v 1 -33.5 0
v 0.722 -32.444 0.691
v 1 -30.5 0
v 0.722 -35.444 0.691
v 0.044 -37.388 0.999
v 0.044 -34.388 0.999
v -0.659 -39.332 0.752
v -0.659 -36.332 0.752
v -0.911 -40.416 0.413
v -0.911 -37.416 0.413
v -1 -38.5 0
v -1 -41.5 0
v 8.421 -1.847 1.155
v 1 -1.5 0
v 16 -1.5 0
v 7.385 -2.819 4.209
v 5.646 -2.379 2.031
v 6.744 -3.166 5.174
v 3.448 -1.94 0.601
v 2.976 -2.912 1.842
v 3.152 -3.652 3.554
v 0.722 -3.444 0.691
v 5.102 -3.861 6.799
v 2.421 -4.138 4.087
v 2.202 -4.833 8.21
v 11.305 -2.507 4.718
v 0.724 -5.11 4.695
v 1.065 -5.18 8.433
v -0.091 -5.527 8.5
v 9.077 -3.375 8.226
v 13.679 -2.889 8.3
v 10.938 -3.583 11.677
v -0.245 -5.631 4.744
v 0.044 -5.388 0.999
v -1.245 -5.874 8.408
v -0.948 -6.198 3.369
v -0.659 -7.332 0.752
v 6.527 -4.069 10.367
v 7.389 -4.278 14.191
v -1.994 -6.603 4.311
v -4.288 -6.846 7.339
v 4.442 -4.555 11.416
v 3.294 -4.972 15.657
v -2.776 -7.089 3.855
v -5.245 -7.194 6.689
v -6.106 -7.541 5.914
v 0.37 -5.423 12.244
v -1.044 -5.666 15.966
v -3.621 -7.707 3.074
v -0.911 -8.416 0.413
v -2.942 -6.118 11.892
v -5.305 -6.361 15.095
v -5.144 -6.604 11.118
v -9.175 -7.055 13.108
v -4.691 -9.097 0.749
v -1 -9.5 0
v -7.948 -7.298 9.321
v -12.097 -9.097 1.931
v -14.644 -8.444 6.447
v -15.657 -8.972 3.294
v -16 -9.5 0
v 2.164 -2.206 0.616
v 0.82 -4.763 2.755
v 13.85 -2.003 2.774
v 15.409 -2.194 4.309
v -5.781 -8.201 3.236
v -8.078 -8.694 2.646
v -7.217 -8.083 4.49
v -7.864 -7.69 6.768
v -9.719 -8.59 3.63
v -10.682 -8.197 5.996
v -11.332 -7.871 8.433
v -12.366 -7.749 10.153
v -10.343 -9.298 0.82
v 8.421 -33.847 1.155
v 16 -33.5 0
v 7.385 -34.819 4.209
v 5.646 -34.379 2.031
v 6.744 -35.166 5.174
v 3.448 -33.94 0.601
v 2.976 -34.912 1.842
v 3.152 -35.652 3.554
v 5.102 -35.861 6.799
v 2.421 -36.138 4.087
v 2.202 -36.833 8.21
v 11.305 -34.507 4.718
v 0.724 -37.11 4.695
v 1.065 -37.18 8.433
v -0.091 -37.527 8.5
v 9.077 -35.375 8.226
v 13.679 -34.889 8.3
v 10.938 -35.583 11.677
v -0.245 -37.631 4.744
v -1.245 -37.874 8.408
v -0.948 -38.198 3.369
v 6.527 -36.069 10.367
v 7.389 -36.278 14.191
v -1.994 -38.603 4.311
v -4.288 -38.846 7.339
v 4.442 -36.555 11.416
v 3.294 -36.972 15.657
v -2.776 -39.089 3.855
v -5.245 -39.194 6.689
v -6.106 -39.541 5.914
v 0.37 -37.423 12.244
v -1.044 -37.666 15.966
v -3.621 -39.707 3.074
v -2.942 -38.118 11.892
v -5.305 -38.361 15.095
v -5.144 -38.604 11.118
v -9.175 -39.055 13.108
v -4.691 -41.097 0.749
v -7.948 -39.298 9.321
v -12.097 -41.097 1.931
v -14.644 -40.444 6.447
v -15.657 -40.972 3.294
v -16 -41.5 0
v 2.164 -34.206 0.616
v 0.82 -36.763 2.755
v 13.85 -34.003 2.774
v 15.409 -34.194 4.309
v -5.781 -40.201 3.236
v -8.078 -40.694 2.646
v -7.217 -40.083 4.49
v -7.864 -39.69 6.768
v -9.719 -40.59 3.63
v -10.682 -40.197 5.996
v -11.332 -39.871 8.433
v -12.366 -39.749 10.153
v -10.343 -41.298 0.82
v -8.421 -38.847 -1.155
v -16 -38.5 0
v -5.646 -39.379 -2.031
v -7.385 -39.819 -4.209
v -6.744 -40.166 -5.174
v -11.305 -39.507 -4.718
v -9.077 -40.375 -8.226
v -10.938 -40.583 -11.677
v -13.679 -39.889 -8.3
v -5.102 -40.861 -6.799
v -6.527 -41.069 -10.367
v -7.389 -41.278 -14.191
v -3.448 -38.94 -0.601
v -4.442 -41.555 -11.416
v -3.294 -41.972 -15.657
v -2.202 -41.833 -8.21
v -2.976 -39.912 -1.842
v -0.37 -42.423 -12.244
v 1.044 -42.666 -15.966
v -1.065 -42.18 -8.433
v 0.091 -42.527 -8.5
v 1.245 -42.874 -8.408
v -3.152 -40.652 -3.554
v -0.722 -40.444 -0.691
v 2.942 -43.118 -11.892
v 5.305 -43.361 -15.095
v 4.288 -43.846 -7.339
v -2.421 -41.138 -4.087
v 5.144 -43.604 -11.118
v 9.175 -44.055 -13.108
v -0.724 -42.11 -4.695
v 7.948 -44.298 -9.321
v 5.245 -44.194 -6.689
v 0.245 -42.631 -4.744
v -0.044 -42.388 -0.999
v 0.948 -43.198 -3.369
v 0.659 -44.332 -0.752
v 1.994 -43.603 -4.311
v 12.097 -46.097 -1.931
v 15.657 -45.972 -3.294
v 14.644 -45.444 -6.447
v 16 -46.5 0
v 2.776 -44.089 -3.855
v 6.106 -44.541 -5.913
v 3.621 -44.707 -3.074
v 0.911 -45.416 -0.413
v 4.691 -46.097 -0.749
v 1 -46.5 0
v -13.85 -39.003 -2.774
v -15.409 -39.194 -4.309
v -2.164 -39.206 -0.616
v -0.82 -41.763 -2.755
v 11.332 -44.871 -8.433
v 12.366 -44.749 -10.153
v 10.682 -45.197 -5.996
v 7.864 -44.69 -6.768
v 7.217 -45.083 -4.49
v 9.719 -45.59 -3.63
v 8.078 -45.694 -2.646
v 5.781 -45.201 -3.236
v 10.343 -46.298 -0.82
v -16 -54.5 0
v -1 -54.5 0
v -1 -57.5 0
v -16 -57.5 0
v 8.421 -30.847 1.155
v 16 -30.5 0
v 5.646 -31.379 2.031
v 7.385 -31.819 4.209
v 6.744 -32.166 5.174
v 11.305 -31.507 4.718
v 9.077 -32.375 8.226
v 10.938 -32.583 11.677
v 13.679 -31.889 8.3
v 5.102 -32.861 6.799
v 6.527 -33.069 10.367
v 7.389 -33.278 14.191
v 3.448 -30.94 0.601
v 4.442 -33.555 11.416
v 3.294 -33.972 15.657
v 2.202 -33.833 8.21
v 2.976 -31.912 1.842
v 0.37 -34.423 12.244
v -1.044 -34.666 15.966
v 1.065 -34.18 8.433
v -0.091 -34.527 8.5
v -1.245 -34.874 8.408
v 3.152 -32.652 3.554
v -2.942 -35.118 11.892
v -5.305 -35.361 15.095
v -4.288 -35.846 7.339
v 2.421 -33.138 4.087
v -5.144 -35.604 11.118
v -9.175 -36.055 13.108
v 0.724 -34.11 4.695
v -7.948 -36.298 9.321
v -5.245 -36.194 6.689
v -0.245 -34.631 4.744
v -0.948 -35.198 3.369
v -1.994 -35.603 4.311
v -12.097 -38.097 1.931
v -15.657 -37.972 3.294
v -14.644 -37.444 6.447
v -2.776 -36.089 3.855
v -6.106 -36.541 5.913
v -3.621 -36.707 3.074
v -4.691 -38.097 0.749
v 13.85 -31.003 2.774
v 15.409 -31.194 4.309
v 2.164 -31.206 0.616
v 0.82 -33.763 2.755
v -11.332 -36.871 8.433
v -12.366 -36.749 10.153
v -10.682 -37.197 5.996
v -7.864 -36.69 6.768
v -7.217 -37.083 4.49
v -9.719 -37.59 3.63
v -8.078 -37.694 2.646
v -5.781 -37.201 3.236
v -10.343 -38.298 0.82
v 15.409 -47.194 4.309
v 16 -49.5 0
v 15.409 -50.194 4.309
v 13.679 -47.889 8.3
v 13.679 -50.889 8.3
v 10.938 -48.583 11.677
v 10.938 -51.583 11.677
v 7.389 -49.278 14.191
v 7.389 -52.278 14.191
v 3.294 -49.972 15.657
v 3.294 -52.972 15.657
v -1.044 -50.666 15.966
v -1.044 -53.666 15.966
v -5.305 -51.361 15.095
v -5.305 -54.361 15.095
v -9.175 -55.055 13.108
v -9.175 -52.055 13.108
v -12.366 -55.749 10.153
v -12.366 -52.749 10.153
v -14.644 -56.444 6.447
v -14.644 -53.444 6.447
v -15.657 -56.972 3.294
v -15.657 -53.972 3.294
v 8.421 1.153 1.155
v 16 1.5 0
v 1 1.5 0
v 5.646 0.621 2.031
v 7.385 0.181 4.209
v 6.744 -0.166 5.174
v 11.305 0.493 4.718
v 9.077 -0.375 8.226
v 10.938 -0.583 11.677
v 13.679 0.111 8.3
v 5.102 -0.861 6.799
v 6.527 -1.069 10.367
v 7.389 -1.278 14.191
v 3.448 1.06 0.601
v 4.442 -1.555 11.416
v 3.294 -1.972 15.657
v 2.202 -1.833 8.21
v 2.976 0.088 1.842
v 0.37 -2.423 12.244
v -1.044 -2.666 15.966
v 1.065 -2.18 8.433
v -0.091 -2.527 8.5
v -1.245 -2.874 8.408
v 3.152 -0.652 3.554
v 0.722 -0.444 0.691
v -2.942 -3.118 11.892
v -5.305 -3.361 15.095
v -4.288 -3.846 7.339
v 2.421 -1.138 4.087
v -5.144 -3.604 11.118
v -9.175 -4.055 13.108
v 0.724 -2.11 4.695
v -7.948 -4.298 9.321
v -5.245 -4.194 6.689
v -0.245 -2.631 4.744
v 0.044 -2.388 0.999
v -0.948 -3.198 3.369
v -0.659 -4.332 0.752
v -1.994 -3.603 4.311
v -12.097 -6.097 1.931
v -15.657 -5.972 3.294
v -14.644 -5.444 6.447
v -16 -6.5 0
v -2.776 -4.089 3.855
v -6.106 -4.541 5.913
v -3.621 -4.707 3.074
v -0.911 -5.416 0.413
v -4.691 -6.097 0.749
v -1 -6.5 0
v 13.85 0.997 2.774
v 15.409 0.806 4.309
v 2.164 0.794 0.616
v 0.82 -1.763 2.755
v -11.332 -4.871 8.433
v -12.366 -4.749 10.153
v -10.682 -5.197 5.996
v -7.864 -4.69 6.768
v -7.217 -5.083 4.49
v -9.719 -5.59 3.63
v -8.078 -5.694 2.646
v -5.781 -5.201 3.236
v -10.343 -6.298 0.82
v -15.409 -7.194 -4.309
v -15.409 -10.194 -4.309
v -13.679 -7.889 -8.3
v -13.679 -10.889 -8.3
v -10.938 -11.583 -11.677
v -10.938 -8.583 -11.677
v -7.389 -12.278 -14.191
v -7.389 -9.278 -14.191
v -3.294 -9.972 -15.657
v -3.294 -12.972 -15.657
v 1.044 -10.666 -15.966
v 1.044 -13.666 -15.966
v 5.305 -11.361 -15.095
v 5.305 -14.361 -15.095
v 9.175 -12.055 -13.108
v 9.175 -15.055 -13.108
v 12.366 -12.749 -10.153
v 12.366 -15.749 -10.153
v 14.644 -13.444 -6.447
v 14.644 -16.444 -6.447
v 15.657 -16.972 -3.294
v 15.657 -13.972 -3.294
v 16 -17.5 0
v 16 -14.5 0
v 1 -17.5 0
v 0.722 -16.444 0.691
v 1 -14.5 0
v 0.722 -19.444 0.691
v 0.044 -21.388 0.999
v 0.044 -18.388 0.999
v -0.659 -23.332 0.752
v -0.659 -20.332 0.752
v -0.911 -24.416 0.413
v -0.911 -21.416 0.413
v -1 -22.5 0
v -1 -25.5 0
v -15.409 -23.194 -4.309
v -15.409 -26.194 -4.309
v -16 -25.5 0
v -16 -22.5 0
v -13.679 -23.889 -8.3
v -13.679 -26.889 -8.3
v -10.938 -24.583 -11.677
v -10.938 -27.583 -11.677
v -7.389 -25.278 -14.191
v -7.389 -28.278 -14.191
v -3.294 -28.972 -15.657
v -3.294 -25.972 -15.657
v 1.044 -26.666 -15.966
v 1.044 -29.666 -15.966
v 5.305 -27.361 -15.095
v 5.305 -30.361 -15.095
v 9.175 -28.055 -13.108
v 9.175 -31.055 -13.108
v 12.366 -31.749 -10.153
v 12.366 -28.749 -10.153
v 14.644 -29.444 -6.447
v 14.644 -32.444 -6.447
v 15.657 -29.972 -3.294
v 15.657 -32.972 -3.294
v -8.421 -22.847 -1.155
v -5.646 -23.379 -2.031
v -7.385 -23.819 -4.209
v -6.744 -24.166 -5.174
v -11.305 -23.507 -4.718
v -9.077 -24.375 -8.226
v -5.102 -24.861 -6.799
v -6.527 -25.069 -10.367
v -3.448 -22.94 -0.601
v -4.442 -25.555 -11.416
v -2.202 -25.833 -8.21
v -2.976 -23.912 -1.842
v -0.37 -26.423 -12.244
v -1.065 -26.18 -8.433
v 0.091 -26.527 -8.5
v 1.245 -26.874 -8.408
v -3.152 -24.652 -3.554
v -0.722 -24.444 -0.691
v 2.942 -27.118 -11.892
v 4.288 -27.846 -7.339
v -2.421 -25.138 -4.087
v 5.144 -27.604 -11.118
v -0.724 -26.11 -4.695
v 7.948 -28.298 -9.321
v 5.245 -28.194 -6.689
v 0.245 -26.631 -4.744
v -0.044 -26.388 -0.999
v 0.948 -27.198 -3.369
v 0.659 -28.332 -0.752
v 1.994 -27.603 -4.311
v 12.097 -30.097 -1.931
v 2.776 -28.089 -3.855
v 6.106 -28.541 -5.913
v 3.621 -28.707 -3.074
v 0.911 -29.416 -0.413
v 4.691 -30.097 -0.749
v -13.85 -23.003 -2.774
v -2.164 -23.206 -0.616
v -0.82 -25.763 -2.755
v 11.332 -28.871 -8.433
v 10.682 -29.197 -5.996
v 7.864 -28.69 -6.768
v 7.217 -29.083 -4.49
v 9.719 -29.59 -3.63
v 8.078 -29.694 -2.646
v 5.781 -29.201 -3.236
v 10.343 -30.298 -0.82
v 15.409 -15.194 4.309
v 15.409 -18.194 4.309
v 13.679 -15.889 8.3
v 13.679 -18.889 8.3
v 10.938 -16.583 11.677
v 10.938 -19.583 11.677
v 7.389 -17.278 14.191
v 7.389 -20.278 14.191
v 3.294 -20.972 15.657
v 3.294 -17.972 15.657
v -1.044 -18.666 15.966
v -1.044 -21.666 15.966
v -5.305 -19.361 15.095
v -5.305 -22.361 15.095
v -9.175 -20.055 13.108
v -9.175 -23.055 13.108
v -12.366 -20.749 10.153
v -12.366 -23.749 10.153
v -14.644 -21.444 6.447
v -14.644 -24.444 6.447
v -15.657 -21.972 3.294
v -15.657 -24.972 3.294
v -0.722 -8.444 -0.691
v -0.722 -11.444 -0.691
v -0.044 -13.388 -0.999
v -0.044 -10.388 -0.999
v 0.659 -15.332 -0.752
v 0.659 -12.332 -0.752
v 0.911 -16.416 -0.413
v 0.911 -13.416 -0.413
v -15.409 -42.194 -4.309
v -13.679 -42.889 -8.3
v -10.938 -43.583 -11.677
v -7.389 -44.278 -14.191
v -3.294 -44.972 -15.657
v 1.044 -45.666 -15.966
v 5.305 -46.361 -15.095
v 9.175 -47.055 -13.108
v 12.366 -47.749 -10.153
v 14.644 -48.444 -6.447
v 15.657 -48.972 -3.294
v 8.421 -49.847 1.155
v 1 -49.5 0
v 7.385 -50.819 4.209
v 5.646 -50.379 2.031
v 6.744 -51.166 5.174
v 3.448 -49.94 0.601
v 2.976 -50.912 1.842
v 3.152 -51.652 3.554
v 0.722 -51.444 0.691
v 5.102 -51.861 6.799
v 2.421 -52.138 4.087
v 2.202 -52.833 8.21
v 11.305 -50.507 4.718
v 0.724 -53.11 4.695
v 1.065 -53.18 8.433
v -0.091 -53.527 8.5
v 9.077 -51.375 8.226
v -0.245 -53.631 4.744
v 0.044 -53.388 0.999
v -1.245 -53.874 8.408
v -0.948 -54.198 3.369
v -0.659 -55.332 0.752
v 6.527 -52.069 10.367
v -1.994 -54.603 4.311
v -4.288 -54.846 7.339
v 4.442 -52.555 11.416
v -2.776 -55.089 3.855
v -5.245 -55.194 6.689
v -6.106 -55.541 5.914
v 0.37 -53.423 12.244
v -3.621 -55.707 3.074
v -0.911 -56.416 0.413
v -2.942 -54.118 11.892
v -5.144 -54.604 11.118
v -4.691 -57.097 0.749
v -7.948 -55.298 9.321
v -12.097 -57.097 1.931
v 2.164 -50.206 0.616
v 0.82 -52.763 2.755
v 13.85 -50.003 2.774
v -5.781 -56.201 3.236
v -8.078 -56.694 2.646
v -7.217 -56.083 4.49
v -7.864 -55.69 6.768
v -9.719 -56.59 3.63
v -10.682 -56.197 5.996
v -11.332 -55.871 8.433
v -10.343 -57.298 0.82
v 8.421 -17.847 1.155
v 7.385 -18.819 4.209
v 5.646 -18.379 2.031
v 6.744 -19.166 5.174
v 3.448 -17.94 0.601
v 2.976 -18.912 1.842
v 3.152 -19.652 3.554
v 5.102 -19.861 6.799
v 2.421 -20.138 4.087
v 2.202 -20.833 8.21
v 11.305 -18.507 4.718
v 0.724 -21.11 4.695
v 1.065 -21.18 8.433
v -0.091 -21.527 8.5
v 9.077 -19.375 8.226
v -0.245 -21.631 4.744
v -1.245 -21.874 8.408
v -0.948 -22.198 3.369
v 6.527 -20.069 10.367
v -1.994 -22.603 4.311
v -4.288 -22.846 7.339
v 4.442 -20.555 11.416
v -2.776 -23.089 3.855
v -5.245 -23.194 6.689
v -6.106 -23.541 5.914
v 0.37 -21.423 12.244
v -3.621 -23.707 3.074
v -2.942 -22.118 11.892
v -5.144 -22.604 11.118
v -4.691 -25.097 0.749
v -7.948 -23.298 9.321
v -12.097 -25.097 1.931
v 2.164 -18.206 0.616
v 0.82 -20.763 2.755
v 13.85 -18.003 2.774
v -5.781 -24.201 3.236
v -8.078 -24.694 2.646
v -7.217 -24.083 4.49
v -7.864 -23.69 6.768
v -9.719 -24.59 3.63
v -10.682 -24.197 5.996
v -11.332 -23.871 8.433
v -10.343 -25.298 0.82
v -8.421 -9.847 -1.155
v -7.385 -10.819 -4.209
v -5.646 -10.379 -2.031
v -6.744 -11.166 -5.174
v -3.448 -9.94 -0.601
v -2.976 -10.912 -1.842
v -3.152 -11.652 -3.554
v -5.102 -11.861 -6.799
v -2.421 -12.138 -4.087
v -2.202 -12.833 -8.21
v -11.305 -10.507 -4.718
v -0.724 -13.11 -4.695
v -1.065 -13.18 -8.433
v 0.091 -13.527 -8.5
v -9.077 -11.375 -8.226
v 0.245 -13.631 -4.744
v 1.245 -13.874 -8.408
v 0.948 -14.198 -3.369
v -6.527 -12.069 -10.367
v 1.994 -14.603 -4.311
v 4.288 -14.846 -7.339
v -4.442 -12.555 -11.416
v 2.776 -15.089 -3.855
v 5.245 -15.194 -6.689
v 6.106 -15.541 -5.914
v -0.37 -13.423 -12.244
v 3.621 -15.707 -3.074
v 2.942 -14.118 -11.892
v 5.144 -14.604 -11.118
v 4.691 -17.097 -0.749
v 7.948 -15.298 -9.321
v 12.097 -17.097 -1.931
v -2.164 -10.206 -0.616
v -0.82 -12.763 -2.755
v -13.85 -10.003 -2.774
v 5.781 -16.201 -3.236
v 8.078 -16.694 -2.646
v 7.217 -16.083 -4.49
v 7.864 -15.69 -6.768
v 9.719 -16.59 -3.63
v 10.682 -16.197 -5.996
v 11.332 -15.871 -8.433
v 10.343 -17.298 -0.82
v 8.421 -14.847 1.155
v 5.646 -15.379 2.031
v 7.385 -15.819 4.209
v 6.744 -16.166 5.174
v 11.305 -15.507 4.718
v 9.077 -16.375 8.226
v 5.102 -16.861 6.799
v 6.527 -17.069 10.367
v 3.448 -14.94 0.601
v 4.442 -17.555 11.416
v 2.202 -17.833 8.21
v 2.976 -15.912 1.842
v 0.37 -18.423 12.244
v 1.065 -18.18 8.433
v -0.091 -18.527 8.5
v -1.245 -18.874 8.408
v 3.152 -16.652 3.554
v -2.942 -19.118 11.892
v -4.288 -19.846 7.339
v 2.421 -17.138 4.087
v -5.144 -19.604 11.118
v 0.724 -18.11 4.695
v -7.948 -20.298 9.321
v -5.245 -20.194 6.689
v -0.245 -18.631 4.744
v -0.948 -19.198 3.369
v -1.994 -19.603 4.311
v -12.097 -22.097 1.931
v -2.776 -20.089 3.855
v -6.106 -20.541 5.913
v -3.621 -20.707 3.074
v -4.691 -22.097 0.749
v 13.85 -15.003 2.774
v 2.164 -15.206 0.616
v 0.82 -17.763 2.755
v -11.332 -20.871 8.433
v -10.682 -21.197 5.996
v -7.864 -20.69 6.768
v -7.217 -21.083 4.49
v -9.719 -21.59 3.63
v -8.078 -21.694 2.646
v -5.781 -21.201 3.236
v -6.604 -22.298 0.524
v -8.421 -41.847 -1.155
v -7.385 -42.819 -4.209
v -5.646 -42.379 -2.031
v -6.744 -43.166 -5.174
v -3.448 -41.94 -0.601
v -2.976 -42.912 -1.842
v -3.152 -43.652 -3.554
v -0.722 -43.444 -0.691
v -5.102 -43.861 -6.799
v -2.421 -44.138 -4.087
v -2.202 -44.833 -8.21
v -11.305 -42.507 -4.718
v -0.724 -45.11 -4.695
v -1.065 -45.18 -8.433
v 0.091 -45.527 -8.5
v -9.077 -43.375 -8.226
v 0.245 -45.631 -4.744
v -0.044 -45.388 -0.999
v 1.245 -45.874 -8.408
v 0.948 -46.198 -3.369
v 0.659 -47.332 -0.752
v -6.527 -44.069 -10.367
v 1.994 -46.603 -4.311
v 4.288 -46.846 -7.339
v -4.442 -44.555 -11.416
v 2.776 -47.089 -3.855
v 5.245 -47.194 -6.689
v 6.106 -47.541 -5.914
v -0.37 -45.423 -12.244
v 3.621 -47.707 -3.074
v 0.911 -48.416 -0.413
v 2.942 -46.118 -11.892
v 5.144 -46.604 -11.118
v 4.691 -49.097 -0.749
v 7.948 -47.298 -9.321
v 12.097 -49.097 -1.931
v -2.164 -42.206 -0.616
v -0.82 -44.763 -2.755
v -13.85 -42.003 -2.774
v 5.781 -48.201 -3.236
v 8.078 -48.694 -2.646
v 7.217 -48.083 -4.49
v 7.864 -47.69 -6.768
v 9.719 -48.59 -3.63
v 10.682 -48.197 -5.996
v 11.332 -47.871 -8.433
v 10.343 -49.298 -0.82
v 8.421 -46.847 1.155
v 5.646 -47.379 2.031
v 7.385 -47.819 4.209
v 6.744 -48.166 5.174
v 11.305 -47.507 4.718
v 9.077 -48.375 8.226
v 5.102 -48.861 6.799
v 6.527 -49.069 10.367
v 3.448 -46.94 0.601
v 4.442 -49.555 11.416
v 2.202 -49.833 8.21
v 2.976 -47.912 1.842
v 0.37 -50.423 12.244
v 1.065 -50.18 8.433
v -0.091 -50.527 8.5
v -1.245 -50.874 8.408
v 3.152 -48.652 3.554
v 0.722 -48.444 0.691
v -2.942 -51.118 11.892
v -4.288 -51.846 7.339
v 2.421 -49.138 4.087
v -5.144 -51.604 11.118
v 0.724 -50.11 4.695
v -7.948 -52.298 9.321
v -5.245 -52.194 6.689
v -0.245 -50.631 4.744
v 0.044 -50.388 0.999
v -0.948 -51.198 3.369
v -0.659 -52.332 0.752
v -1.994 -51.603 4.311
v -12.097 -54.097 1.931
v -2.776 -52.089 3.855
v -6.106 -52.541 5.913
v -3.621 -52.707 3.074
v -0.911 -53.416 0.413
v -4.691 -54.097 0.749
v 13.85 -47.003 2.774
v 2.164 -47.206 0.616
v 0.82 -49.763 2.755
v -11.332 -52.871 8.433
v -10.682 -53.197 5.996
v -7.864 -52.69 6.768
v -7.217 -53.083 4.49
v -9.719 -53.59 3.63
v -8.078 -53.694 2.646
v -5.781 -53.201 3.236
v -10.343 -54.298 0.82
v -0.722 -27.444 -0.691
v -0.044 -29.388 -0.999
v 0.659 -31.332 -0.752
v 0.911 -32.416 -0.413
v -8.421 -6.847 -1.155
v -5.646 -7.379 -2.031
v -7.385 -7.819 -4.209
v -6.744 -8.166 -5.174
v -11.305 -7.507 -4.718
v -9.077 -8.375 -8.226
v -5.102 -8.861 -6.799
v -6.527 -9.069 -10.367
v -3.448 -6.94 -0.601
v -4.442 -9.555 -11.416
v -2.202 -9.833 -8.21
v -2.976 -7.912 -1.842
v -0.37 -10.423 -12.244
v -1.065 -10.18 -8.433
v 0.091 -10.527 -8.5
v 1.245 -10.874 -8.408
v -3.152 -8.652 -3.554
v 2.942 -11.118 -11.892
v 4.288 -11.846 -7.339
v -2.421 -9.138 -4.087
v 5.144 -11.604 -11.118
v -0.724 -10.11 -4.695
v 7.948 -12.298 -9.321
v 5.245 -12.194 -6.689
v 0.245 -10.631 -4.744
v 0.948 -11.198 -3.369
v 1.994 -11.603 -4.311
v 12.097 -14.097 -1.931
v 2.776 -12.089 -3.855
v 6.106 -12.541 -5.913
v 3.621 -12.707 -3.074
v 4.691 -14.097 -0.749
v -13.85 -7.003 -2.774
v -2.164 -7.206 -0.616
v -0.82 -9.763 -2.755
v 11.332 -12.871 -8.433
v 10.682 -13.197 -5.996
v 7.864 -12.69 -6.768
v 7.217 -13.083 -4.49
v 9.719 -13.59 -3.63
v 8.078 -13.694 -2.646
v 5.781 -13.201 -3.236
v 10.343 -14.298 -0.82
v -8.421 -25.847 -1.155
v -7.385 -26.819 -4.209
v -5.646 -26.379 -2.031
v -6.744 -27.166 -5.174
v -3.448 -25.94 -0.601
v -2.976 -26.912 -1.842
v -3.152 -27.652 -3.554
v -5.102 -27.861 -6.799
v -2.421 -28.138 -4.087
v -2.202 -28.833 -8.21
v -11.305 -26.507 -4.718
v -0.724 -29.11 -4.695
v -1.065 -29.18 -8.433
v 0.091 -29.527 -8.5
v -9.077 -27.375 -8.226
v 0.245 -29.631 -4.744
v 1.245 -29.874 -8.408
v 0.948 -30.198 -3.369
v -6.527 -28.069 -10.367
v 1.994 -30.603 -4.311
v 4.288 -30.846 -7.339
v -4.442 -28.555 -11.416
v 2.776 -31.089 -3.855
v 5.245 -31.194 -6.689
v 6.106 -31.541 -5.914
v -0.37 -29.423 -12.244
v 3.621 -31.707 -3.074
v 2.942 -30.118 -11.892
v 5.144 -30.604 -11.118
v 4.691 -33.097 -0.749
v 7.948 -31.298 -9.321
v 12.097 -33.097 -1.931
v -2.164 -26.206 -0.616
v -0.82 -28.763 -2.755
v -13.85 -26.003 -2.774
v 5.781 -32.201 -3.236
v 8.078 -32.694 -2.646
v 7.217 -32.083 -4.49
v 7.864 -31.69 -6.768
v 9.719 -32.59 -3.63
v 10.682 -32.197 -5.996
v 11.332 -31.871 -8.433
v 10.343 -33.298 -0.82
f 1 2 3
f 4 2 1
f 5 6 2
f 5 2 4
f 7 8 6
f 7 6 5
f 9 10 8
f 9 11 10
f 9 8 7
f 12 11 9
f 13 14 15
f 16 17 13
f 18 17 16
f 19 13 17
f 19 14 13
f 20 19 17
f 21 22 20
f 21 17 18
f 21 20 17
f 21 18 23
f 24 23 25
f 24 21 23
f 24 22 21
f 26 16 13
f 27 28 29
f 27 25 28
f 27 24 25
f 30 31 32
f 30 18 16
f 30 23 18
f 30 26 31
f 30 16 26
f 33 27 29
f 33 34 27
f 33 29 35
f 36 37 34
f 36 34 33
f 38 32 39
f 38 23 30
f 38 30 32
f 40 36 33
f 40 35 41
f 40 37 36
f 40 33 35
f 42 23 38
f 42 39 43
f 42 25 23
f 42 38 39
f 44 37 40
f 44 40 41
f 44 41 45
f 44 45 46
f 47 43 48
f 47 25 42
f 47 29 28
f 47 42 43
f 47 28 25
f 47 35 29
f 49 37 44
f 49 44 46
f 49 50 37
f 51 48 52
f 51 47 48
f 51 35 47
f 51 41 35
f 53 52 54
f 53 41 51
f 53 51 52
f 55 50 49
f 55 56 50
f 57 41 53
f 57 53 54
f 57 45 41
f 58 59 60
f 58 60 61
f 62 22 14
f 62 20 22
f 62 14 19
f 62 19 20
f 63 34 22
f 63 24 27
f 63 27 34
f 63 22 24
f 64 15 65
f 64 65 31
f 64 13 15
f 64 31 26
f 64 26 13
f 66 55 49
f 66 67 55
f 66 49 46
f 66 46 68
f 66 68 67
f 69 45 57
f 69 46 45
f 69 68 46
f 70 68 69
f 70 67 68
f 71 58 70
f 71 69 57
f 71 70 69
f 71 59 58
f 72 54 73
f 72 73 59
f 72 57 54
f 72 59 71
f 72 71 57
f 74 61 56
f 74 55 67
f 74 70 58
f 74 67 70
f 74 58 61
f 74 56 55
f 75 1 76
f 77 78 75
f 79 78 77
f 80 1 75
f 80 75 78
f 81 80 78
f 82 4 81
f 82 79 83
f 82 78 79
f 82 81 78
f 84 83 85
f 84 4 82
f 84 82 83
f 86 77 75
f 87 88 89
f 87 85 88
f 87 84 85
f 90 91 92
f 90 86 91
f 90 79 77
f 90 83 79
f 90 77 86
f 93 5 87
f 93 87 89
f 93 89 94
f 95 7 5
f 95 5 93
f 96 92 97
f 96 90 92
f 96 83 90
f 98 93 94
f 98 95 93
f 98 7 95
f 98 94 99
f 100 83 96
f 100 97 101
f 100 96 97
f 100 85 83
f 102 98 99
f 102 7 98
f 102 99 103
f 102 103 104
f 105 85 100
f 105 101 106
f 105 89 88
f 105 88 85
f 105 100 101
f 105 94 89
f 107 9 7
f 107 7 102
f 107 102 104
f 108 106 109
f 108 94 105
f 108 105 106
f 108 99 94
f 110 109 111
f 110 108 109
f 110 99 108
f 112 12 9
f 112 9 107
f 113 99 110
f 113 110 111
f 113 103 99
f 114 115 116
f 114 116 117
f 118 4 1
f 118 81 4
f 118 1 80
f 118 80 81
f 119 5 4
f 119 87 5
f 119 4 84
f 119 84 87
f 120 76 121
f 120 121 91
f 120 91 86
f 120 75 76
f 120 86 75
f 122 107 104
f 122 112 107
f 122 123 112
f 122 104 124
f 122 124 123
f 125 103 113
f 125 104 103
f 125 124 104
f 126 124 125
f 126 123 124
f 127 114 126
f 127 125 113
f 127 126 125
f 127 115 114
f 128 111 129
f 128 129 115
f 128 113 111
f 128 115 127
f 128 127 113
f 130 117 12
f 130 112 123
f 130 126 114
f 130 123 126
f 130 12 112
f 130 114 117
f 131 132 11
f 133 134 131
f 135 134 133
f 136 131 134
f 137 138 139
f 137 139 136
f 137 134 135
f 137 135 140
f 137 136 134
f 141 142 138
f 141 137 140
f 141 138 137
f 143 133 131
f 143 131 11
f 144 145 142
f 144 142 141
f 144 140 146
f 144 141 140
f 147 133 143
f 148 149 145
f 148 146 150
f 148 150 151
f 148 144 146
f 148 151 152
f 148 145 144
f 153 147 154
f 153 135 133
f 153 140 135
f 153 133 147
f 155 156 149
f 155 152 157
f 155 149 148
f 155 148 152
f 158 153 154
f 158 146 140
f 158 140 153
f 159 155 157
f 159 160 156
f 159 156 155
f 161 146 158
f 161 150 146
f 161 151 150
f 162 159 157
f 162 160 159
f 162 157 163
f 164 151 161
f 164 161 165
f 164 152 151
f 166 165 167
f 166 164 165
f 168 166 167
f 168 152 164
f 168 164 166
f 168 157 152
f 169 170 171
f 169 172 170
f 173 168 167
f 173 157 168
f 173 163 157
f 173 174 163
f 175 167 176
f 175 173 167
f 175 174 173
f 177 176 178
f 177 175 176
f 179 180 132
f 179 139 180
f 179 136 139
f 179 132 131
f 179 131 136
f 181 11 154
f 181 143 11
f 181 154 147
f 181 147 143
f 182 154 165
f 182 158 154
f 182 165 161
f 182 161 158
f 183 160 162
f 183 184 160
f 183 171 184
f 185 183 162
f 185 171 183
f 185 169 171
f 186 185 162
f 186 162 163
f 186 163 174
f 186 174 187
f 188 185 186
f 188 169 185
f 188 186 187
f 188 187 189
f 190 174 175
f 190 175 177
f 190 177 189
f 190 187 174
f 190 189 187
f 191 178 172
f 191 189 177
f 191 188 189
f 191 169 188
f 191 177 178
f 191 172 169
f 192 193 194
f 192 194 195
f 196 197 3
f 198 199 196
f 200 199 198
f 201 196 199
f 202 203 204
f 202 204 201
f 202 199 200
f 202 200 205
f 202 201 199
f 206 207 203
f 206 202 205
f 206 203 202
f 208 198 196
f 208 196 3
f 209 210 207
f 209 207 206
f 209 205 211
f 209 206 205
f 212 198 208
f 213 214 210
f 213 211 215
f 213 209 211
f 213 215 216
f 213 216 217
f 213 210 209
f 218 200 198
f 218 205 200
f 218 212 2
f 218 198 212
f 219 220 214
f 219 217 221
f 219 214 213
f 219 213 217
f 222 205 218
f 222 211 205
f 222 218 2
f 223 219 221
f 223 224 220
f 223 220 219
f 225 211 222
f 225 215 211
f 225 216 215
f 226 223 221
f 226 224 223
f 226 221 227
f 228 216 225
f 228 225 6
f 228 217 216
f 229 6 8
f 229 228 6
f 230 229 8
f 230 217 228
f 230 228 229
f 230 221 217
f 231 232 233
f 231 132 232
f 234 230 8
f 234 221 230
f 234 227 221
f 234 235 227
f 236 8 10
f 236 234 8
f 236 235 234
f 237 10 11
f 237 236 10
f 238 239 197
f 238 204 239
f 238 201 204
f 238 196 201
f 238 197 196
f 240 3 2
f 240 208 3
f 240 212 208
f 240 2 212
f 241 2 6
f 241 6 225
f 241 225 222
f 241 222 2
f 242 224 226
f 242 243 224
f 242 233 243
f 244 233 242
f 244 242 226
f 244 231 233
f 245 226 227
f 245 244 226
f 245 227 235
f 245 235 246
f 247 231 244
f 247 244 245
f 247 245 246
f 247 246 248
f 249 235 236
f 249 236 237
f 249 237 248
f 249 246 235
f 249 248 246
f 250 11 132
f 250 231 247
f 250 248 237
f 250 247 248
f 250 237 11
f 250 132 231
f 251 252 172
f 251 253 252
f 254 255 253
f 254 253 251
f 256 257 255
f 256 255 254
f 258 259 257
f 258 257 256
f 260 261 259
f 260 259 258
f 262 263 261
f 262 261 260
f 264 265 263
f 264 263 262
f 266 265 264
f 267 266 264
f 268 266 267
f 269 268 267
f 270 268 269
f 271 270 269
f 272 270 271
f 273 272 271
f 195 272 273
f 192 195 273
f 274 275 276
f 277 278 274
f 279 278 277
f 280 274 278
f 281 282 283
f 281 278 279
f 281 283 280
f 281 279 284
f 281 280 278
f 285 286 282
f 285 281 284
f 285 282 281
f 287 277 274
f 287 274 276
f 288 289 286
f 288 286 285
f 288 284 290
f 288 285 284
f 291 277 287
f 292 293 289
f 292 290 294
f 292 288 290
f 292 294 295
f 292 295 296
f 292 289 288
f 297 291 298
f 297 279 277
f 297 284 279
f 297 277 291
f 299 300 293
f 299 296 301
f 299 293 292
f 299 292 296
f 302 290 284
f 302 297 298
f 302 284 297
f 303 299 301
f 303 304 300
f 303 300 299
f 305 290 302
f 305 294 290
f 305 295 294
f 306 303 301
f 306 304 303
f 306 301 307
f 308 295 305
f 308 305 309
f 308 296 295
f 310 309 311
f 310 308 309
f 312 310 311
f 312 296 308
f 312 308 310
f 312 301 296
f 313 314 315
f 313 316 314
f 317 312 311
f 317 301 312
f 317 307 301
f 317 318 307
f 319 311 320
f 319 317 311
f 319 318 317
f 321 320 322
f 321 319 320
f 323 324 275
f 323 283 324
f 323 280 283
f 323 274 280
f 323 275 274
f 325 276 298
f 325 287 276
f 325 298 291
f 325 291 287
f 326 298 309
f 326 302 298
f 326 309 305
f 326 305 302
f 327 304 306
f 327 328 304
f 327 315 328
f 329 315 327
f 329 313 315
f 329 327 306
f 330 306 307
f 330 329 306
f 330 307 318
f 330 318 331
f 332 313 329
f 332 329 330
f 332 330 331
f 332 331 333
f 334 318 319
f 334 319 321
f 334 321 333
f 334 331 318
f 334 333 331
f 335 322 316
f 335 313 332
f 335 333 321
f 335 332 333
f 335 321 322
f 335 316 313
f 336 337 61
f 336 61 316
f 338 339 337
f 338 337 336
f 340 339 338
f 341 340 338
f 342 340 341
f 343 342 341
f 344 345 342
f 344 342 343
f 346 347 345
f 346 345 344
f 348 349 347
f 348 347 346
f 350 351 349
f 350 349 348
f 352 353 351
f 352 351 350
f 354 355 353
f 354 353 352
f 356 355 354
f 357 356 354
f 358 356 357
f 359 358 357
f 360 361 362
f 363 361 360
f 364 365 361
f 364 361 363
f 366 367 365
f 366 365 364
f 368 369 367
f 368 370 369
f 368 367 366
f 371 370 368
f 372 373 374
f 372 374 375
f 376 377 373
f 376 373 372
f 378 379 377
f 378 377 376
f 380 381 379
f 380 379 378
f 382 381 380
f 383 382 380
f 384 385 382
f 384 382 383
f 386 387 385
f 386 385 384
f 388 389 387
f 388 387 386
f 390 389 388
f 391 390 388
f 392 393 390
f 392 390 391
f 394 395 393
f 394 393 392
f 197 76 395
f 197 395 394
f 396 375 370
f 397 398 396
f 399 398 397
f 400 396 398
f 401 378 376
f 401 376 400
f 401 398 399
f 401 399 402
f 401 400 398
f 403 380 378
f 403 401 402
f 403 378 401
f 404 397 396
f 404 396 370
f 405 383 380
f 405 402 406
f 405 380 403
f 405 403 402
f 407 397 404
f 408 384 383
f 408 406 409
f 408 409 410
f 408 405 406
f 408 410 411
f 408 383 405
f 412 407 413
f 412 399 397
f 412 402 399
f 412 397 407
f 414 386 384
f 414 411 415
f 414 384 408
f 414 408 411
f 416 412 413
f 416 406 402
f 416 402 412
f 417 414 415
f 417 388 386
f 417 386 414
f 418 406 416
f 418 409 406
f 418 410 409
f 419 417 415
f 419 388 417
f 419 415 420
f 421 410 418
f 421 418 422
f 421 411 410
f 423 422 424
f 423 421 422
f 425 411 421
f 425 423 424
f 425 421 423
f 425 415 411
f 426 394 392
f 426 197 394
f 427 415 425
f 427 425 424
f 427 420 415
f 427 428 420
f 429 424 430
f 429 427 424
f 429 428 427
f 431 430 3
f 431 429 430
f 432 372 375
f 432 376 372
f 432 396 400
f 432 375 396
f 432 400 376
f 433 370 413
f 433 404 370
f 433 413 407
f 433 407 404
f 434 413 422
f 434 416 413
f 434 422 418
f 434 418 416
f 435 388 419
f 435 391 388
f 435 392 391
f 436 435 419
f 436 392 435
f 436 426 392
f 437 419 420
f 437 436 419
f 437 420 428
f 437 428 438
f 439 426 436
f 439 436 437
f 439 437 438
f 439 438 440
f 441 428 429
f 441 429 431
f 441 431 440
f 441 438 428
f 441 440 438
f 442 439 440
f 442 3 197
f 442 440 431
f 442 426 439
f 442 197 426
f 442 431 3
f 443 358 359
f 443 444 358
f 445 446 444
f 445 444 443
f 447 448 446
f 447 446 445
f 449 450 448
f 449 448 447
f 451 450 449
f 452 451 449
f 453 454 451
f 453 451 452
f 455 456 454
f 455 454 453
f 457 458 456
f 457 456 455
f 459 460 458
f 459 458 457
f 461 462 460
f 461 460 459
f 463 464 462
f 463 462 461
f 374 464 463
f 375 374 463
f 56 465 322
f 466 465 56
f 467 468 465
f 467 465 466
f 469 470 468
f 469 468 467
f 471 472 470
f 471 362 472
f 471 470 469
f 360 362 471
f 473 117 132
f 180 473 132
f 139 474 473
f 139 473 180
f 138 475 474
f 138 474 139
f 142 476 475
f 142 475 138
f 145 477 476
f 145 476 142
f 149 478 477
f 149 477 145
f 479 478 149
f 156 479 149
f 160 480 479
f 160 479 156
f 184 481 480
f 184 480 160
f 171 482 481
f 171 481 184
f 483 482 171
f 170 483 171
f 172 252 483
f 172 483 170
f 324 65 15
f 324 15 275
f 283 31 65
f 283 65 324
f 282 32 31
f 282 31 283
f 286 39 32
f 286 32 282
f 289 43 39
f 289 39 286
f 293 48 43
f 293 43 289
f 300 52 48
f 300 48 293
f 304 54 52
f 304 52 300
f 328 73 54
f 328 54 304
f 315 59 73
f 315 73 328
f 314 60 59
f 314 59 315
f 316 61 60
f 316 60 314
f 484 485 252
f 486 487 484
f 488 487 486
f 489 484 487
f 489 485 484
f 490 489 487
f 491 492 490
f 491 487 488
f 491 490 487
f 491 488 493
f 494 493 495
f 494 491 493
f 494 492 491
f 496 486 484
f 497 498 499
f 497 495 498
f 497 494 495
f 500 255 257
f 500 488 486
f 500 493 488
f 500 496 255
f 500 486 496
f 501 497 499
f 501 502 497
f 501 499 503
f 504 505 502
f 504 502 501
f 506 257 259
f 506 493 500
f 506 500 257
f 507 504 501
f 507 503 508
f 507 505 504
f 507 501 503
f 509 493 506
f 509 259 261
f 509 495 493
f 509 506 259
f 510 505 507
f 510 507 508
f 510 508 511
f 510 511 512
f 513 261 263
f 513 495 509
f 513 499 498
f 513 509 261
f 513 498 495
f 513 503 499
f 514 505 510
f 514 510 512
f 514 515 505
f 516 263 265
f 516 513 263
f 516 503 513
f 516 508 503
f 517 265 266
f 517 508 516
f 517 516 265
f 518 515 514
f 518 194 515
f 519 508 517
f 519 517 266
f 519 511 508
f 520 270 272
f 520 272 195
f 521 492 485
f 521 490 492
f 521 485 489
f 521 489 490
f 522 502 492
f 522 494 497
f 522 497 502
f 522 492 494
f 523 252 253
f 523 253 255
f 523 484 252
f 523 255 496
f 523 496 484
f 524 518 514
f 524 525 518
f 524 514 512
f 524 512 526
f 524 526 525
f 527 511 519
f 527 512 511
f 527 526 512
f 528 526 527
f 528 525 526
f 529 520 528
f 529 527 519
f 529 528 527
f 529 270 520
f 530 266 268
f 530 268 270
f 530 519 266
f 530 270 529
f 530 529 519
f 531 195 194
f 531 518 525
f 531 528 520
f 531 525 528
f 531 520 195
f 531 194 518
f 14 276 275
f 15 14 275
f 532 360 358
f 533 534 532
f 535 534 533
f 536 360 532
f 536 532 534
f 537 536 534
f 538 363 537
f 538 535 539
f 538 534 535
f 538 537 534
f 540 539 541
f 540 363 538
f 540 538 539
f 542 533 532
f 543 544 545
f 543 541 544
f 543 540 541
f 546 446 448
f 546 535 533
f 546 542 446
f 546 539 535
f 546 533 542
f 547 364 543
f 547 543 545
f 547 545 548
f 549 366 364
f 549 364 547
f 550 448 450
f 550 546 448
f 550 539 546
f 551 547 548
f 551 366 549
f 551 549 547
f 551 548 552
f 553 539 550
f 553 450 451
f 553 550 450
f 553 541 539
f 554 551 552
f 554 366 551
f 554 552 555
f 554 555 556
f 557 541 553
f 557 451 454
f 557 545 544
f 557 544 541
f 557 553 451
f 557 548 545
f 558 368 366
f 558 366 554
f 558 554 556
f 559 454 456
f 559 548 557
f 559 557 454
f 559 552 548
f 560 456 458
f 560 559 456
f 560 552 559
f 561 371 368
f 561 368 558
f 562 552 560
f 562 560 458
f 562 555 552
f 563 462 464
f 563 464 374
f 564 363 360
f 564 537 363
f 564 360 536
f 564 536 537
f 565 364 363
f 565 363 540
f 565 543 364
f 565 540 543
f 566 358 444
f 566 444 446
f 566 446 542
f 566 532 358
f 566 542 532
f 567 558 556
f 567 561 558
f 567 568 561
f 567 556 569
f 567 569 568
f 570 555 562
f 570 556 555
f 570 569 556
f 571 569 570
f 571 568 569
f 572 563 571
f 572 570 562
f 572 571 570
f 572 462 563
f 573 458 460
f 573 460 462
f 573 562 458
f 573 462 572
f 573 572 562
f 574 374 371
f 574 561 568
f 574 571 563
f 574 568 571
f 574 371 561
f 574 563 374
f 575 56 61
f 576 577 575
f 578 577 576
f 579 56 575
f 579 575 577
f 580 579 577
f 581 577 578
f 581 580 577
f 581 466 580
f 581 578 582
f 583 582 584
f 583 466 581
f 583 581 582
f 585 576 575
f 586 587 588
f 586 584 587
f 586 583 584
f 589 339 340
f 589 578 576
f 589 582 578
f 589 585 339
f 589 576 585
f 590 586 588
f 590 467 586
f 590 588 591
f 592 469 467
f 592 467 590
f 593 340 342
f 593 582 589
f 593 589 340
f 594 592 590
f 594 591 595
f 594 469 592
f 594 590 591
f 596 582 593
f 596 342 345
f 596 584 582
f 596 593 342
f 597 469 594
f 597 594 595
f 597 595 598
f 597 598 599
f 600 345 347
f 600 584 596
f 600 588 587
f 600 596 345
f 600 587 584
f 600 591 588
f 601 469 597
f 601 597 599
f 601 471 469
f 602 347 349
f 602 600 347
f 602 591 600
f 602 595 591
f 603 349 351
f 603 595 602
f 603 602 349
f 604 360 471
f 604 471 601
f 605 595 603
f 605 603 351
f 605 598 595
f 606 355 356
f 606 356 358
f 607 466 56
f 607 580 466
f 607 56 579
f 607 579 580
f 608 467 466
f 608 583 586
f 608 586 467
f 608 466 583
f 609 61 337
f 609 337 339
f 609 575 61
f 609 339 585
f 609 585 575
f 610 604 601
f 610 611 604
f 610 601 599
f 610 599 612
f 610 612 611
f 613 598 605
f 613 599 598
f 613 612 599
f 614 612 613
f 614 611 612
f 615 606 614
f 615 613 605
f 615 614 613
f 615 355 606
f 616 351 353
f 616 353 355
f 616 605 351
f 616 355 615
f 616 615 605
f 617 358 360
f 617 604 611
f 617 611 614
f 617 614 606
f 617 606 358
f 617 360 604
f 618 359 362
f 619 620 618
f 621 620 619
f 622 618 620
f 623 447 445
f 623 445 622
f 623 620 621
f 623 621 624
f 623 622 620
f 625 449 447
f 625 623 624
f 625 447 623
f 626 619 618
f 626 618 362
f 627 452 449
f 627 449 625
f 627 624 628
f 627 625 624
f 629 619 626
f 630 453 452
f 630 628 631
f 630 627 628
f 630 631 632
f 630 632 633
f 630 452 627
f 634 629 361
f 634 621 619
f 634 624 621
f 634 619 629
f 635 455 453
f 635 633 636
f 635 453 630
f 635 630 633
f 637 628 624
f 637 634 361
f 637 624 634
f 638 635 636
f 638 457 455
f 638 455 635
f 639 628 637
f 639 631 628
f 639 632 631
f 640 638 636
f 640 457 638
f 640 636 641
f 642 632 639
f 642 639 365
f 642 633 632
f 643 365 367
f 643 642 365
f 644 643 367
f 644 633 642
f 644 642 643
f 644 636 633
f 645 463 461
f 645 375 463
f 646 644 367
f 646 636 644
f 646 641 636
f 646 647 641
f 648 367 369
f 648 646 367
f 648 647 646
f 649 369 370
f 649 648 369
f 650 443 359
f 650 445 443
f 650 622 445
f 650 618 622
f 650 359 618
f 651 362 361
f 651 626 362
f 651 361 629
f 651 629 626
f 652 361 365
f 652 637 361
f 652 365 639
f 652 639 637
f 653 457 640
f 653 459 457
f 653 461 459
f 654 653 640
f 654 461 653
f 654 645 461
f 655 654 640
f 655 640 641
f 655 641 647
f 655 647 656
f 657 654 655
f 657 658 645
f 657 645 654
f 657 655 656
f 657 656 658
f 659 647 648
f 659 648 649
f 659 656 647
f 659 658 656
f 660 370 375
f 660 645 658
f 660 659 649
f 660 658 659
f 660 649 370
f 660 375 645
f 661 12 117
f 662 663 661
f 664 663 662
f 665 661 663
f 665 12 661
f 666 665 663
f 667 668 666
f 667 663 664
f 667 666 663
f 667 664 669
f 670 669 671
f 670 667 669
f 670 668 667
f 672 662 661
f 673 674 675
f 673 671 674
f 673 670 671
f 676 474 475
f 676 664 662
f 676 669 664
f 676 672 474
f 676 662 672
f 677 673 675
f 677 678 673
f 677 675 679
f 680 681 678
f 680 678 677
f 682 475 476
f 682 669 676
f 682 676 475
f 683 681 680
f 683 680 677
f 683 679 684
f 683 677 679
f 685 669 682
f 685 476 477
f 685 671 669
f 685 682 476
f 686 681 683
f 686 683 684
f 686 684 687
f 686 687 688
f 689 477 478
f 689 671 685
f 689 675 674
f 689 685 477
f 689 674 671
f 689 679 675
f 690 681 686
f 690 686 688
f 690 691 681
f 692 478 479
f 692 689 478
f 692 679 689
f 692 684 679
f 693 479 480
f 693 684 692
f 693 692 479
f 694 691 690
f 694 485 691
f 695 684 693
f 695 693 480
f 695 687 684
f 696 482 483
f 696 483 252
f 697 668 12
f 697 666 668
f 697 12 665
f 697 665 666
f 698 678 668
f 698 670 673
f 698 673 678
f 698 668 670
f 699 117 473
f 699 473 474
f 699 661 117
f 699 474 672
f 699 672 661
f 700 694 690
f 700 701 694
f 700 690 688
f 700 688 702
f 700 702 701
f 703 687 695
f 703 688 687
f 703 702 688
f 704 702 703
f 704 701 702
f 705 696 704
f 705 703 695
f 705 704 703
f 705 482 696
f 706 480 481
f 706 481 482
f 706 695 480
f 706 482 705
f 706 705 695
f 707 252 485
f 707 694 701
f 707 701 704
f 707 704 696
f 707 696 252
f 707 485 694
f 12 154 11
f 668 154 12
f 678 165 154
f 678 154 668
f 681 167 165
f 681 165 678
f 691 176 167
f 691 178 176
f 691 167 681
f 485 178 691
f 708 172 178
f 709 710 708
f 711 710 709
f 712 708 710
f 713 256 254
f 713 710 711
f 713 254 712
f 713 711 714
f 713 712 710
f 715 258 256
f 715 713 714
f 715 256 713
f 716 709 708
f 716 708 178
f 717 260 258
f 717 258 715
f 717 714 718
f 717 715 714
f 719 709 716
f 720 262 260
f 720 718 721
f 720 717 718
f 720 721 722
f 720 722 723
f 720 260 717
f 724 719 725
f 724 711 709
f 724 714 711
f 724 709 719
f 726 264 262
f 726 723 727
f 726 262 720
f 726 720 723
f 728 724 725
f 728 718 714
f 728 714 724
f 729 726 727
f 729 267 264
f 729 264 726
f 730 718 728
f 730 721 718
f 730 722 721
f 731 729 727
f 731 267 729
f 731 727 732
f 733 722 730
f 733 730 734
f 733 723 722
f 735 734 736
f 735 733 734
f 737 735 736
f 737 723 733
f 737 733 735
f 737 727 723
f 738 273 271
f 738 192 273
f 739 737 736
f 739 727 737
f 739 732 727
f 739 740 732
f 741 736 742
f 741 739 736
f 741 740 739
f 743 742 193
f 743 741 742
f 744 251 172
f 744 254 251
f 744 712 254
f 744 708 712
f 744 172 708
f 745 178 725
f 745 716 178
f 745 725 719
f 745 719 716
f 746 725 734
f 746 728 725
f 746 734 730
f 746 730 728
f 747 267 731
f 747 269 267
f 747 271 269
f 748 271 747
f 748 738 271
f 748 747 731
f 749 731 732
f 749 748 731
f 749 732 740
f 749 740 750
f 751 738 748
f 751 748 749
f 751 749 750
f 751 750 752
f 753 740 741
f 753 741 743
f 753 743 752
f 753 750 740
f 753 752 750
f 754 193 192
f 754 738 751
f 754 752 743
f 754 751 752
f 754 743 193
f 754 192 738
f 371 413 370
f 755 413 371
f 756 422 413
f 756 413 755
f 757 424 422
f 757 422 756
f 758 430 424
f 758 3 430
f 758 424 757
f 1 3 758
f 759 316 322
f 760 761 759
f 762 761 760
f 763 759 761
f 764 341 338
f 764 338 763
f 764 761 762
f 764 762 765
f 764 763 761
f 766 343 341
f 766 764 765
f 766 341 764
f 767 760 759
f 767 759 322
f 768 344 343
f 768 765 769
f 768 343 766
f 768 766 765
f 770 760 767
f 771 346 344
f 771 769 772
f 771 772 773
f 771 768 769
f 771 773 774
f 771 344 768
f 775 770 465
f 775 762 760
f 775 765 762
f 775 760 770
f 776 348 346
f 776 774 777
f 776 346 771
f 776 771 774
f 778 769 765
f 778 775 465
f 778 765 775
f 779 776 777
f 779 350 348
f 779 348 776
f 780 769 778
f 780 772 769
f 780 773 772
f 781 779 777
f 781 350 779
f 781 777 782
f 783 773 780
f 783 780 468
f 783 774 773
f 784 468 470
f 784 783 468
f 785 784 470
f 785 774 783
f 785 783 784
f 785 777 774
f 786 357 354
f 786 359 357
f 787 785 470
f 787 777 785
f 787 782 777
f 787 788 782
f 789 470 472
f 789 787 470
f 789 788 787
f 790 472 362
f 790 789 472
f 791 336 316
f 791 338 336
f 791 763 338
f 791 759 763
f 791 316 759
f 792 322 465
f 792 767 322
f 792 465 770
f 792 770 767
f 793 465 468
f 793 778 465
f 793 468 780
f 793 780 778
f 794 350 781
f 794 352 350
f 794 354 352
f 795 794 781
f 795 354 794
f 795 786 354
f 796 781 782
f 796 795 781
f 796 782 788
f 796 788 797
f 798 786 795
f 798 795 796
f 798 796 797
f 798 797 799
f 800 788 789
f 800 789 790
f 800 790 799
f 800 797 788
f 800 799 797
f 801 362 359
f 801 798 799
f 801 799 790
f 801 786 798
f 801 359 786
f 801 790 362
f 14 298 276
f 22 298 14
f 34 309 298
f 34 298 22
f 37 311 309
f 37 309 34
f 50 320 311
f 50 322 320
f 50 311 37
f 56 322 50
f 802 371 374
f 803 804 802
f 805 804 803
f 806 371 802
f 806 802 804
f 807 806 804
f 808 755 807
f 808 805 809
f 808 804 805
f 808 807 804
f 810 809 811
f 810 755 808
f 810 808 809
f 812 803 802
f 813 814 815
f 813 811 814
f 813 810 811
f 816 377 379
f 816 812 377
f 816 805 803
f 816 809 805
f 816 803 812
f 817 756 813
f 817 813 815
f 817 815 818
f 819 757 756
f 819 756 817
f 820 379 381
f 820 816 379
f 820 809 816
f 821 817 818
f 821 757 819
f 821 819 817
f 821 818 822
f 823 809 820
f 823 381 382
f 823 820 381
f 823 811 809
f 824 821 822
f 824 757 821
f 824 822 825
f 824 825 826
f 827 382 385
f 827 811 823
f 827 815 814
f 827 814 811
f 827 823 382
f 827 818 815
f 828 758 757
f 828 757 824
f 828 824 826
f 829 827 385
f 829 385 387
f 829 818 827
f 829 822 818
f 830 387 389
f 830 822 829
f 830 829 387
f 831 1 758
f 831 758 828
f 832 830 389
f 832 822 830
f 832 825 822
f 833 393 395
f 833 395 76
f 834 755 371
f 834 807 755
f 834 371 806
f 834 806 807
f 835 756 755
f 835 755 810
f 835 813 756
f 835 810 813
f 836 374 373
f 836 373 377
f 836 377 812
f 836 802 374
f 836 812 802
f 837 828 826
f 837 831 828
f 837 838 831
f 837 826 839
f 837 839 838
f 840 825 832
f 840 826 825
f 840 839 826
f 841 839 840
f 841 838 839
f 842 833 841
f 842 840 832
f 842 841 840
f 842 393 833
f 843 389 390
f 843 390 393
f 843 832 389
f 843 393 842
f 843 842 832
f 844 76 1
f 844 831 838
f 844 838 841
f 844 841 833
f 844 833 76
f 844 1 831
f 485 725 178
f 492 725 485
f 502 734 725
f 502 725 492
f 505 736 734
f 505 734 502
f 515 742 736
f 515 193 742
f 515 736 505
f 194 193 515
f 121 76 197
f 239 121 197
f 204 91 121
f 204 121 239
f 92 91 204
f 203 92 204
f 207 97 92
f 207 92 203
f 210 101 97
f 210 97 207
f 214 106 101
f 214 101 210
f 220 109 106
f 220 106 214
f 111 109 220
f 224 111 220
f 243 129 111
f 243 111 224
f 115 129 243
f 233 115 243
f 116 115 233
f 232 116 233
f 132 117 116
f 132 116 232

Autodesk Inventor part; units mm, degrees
ref_plane "YZ Plane" through (0, 0, 0) normal (1, 0, 0) x (0, 1, 0)
ref_plane "XZ Plane" through (0, 0, 0) normal (0, 1, 0) x (-1, 0, 0)
ref_plane "XY Plane" through (0, 0, 0) normal (0, 0, 1) x (1, 0, 0)
sketch "Boceto3" plane through (0, 0, 0) normal (0, 0, 1) x (1, 0, 0)
  line L0 (1, 1.5) -> (16, 1.5)
  line L1 (16, 1.5) -> (16, -1.5)
  line L2 (16, -1.5) -> (1, -1.5)
  line L3 (1, -1.5) -> (1, 1.5)
  point P0 (0, 0)
  point P1 (1, 0)
  dimension "d4" = 3
  dimension "d5" = 15
  dimension "d6" = 16
coil "Bobina1" sketch "Boceto3" operation add axis through (0, -10, 0) along (0, -1, 0) pitch 16 turns 3.5 hand right
properties part number "bobina"
